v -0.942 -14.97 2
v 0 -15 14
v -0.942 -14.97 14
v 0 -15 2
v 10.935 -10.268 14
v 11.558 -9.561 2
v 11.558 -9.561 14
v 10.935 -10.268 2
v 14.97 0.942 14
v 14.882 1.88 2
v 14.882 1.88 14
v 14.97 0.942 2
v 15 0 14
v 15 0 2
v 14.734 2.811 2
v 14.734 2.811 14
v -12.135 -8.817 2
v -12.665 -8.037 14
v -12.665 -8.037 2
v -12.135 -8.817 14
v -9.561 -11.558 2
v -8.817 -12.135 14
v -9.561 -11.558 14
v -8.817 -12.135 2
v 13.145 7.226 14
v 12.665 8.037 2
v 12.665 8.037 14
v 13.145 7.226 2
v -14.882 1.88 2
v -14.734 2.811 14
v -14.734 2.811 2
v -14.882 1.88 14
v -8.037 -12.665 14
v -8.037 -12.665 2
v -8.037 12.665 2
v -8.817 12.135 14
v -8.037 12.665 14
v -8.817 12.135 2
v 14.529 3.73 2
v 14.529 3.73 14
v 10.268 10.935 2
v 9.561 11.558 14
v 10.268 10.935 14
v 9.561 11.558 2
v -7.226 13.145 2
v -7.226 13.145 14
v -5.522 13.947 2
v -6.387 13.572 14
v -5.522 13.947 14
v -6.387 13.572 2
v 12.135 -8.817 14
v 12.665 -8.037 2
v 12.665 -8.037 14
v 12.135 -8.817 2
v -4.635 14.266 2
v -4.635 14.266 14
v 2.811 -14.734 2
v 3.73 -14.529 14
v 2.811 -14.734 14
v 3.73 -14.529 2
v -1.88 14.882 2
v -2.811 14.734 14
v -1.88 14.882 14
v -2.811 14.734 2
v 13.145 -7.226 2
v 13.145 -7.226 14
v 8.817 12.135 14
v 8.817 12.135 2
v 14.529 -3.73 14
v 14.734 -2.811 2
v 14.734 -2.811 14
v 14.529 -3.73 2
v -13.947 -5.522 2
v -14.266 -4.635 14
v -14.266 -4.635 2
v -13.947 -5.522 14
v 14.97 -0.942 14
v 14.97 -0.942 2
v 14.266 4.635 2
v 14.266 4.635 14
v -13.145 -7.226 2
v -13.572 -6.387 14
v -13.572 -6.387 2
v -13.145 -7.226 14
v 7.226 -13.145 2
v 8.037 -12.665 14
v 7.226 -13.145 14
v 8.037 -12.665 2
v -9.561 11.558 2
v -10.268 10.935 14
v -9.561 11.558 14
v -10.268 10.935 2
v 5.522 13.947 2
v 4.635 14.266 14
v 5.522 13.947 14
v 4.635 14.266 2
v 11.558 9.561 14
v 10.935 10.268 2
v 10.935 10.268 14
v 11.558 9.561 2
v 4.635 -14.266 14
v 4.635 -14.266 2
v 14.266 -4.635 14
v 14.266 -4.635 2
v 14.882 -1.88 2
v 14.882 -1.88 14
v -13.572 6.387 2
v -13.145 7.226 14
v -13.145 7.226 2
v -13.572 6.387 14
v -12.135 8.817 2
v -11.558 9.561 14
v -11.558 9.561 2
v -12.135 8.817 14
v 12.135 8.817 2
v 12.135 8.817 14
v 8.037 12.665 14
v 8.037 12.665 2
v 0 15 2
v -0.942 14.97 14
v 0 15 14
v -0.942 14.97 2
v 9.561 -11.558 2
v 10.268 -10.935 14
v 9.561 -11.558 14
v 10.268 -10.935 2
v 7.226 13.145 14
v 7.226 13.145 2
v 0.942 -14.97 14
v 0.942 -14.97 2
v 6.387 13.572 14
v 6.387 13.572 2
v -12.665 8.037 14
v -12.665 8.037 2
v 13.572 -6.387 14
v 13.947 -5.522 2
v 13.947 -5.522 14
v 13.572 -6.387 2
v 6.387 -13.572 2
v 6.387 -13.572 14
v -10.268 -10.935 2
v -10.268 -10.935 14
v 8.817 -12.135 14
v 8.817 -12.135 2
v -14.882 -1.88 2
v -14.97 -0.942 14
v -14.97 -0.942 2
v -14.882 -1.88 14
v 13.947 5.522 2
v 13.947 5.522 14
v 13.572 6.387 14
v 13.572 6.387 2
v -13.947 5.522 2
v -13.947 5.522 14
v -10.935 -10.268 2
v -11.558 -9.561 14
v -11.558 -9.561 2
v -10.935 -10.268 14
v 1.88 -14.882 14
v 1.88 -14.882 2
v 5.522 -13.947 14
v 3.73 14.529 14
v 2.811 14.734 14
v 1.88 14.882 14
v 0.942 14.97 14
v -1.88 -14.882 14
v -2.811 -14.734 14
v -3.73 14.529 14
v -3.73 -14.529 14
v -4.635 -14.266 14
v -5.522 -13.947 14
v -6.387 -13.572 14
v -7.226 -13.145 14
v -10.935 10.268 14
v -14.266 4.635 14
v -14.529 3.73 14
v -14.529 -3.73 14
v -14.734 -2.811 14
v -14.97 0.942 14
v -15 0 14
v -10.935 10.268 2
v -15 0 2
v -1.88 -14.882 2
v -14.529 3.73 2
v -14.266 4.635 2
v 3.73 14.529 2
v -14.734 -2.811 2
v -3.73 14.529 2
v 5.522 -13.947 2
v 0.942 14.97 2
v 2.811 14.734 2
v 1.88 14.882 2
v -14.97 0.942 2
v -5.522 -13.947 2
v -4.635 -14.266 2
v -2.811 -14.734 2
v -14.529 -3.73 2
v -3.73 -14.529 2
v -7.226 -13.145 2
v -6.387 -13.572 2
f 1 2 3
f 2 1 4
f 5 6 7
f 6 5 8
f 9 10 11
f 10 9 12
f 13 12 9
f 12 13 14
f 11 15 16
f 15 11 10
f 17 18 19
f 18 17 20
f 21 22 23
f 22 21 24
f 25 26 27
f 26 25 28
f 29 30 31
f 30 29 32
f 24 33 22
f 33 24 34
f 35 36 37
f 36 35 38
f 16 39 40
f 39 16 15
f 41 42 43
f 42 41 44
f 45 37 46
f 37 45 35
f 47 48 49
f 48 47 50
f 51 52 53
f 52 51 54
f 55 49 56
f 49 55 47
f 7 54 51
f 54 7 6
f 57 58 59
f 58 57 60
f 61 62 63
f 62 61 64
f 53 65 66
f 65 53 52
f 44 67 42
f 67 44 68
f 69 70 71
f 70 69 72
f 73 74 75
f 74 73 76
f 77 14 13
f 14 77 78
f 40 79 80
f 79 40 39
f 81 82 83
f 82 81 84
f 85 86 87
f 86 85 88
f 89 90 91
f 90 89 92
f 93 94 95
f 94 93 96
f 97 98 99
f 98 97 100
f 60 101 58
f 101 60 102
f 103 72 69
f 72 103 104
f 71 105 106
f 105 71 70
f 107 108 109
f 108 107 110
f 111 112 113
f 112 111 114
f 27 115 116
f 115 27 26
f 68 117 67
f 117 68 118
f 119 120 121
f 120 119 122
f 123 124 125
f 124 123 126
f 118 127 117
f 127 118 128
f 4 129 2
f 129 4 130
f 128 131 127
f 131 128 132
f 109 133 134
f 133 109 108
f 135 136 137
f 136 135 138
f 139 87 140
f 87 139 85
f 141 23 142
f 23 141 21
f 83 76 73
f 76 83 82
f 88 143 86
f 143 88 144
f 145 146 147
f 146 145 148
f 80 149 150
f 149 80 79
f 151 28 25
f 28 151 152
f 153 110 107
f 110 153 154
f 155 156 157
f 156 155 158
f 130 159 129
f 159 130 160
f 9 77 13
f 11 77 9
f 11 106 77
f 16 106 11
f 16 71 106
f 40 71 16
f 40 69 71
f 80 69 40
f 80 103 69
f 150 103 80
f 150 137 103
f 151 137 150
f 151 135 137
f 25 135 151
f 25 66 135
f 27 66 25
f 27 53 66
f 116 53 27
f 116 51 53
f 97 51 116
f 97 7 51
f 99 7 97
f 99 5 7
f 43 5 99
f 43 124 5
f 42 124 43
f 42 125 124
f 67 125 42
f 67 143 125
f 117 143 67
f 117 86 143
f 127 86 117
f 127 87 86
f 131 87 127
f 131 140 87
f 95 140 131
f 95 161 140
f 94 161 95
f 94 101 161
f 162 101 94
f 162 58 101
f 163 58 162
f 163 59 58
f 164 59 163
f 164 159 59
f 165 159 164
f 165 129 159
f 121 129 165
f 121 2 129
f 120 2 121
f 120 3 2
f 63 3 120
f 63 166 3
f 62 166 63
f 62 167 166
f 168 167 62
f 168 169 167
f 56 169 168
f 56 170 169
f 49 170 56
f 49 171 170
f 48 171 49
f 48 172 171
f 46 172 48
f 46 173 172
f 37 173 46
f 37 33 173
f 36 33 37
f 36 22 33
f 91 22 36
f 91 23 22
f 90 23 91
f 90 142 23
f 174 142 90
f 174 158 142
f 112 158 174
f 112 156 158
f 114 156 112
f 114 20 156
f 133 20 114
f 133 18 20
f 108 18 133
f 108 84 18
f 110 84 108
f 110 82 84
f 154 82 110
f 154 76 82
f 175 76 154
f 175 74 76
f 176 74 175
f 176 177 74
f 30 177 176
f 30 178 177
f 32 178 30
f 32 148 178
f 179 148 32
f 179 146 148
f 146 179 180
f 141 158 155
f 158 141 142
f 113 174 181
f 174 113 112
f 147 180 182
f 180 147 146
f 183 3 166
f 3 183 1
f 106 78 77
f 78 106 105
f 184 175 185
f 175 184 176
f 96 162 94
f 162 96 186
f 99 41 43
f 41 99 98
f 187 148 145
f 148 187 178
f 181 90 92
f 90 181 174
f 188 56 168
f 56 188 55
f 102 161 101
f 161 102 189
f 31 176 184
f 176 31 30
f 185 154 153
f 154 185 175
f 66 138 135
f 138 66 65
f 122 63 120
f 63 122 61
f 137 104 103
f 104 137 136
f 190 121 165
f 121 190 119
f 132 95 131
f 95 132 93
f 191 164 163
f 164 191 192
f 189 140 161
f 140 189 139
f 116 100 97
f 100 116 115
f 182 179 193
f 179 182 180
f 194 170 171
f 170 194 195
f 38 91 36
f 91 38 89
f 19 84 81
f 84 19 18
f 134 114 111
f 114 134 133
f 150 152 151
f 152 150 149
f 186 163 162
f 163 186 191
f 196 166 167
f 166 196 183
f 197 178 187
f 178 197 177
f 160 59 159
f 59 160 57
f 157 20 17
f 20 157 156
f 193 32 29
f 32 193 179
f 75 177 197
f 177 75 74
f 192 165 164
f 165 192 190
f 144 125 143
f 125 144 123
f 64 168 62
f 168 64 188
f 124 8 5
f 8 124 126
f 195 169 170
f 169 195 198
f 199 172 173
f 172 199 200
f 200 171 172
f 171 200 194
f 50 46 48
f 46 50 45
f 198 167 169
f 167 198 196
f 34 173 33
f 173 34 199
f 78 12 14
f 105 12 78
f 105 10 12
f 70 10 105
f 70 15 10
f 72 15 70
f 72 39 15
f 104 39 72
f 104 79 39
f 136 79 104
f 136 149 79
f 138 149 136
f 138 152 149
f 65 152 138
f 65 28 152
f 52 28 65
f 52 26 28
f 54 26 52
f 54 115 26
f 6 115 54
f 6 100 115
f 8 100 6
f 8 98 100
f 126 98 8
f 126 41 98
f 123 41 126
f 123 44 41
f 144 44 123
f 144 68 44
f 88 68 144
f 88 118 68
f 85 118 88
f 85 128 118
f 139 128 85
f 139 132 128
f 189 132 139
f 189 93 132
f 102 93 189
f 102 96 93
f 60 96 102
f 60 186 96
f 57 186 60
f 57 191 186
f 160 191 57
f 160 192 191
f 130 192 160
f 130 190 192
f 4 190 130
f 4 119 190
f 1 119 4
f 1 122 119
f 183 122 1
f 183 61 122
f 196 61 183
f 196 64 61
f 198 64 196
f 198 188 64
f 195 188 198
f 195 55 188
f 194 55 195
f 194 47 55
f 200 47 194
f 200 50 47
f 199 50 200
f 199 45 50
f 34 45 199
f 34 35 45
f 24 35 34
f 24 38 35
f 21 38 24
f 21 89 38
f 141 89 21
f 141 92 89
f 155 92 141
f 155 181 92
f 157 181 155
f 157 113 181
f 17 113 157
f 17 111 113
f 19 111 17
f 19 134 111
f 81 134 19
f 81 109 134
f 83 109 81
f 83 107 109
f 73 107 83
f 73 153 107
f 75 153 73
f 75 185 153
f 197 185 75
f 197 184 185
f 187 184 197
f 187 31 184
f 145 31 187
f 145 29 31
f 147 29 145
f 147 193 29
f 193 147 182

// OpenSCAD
pullyHeight = 14;
holeDiameter = 5;
pullyInnerDiameter = 30;
pullyWallWidth = 2;

$fn = 100;

difference() {
    cylinder(r = pullyInnerDiameter/2, h = pullyHeight);
    cylinder(r=(pullyInnerDiameter+6)/2, h = pullyWallWidth);
    // translate([0,0,pullyHeight-2]) cylinder(r=pullyHeight
}

// difference() {
//     hull() {
//         sphere = 
//     }
// }
